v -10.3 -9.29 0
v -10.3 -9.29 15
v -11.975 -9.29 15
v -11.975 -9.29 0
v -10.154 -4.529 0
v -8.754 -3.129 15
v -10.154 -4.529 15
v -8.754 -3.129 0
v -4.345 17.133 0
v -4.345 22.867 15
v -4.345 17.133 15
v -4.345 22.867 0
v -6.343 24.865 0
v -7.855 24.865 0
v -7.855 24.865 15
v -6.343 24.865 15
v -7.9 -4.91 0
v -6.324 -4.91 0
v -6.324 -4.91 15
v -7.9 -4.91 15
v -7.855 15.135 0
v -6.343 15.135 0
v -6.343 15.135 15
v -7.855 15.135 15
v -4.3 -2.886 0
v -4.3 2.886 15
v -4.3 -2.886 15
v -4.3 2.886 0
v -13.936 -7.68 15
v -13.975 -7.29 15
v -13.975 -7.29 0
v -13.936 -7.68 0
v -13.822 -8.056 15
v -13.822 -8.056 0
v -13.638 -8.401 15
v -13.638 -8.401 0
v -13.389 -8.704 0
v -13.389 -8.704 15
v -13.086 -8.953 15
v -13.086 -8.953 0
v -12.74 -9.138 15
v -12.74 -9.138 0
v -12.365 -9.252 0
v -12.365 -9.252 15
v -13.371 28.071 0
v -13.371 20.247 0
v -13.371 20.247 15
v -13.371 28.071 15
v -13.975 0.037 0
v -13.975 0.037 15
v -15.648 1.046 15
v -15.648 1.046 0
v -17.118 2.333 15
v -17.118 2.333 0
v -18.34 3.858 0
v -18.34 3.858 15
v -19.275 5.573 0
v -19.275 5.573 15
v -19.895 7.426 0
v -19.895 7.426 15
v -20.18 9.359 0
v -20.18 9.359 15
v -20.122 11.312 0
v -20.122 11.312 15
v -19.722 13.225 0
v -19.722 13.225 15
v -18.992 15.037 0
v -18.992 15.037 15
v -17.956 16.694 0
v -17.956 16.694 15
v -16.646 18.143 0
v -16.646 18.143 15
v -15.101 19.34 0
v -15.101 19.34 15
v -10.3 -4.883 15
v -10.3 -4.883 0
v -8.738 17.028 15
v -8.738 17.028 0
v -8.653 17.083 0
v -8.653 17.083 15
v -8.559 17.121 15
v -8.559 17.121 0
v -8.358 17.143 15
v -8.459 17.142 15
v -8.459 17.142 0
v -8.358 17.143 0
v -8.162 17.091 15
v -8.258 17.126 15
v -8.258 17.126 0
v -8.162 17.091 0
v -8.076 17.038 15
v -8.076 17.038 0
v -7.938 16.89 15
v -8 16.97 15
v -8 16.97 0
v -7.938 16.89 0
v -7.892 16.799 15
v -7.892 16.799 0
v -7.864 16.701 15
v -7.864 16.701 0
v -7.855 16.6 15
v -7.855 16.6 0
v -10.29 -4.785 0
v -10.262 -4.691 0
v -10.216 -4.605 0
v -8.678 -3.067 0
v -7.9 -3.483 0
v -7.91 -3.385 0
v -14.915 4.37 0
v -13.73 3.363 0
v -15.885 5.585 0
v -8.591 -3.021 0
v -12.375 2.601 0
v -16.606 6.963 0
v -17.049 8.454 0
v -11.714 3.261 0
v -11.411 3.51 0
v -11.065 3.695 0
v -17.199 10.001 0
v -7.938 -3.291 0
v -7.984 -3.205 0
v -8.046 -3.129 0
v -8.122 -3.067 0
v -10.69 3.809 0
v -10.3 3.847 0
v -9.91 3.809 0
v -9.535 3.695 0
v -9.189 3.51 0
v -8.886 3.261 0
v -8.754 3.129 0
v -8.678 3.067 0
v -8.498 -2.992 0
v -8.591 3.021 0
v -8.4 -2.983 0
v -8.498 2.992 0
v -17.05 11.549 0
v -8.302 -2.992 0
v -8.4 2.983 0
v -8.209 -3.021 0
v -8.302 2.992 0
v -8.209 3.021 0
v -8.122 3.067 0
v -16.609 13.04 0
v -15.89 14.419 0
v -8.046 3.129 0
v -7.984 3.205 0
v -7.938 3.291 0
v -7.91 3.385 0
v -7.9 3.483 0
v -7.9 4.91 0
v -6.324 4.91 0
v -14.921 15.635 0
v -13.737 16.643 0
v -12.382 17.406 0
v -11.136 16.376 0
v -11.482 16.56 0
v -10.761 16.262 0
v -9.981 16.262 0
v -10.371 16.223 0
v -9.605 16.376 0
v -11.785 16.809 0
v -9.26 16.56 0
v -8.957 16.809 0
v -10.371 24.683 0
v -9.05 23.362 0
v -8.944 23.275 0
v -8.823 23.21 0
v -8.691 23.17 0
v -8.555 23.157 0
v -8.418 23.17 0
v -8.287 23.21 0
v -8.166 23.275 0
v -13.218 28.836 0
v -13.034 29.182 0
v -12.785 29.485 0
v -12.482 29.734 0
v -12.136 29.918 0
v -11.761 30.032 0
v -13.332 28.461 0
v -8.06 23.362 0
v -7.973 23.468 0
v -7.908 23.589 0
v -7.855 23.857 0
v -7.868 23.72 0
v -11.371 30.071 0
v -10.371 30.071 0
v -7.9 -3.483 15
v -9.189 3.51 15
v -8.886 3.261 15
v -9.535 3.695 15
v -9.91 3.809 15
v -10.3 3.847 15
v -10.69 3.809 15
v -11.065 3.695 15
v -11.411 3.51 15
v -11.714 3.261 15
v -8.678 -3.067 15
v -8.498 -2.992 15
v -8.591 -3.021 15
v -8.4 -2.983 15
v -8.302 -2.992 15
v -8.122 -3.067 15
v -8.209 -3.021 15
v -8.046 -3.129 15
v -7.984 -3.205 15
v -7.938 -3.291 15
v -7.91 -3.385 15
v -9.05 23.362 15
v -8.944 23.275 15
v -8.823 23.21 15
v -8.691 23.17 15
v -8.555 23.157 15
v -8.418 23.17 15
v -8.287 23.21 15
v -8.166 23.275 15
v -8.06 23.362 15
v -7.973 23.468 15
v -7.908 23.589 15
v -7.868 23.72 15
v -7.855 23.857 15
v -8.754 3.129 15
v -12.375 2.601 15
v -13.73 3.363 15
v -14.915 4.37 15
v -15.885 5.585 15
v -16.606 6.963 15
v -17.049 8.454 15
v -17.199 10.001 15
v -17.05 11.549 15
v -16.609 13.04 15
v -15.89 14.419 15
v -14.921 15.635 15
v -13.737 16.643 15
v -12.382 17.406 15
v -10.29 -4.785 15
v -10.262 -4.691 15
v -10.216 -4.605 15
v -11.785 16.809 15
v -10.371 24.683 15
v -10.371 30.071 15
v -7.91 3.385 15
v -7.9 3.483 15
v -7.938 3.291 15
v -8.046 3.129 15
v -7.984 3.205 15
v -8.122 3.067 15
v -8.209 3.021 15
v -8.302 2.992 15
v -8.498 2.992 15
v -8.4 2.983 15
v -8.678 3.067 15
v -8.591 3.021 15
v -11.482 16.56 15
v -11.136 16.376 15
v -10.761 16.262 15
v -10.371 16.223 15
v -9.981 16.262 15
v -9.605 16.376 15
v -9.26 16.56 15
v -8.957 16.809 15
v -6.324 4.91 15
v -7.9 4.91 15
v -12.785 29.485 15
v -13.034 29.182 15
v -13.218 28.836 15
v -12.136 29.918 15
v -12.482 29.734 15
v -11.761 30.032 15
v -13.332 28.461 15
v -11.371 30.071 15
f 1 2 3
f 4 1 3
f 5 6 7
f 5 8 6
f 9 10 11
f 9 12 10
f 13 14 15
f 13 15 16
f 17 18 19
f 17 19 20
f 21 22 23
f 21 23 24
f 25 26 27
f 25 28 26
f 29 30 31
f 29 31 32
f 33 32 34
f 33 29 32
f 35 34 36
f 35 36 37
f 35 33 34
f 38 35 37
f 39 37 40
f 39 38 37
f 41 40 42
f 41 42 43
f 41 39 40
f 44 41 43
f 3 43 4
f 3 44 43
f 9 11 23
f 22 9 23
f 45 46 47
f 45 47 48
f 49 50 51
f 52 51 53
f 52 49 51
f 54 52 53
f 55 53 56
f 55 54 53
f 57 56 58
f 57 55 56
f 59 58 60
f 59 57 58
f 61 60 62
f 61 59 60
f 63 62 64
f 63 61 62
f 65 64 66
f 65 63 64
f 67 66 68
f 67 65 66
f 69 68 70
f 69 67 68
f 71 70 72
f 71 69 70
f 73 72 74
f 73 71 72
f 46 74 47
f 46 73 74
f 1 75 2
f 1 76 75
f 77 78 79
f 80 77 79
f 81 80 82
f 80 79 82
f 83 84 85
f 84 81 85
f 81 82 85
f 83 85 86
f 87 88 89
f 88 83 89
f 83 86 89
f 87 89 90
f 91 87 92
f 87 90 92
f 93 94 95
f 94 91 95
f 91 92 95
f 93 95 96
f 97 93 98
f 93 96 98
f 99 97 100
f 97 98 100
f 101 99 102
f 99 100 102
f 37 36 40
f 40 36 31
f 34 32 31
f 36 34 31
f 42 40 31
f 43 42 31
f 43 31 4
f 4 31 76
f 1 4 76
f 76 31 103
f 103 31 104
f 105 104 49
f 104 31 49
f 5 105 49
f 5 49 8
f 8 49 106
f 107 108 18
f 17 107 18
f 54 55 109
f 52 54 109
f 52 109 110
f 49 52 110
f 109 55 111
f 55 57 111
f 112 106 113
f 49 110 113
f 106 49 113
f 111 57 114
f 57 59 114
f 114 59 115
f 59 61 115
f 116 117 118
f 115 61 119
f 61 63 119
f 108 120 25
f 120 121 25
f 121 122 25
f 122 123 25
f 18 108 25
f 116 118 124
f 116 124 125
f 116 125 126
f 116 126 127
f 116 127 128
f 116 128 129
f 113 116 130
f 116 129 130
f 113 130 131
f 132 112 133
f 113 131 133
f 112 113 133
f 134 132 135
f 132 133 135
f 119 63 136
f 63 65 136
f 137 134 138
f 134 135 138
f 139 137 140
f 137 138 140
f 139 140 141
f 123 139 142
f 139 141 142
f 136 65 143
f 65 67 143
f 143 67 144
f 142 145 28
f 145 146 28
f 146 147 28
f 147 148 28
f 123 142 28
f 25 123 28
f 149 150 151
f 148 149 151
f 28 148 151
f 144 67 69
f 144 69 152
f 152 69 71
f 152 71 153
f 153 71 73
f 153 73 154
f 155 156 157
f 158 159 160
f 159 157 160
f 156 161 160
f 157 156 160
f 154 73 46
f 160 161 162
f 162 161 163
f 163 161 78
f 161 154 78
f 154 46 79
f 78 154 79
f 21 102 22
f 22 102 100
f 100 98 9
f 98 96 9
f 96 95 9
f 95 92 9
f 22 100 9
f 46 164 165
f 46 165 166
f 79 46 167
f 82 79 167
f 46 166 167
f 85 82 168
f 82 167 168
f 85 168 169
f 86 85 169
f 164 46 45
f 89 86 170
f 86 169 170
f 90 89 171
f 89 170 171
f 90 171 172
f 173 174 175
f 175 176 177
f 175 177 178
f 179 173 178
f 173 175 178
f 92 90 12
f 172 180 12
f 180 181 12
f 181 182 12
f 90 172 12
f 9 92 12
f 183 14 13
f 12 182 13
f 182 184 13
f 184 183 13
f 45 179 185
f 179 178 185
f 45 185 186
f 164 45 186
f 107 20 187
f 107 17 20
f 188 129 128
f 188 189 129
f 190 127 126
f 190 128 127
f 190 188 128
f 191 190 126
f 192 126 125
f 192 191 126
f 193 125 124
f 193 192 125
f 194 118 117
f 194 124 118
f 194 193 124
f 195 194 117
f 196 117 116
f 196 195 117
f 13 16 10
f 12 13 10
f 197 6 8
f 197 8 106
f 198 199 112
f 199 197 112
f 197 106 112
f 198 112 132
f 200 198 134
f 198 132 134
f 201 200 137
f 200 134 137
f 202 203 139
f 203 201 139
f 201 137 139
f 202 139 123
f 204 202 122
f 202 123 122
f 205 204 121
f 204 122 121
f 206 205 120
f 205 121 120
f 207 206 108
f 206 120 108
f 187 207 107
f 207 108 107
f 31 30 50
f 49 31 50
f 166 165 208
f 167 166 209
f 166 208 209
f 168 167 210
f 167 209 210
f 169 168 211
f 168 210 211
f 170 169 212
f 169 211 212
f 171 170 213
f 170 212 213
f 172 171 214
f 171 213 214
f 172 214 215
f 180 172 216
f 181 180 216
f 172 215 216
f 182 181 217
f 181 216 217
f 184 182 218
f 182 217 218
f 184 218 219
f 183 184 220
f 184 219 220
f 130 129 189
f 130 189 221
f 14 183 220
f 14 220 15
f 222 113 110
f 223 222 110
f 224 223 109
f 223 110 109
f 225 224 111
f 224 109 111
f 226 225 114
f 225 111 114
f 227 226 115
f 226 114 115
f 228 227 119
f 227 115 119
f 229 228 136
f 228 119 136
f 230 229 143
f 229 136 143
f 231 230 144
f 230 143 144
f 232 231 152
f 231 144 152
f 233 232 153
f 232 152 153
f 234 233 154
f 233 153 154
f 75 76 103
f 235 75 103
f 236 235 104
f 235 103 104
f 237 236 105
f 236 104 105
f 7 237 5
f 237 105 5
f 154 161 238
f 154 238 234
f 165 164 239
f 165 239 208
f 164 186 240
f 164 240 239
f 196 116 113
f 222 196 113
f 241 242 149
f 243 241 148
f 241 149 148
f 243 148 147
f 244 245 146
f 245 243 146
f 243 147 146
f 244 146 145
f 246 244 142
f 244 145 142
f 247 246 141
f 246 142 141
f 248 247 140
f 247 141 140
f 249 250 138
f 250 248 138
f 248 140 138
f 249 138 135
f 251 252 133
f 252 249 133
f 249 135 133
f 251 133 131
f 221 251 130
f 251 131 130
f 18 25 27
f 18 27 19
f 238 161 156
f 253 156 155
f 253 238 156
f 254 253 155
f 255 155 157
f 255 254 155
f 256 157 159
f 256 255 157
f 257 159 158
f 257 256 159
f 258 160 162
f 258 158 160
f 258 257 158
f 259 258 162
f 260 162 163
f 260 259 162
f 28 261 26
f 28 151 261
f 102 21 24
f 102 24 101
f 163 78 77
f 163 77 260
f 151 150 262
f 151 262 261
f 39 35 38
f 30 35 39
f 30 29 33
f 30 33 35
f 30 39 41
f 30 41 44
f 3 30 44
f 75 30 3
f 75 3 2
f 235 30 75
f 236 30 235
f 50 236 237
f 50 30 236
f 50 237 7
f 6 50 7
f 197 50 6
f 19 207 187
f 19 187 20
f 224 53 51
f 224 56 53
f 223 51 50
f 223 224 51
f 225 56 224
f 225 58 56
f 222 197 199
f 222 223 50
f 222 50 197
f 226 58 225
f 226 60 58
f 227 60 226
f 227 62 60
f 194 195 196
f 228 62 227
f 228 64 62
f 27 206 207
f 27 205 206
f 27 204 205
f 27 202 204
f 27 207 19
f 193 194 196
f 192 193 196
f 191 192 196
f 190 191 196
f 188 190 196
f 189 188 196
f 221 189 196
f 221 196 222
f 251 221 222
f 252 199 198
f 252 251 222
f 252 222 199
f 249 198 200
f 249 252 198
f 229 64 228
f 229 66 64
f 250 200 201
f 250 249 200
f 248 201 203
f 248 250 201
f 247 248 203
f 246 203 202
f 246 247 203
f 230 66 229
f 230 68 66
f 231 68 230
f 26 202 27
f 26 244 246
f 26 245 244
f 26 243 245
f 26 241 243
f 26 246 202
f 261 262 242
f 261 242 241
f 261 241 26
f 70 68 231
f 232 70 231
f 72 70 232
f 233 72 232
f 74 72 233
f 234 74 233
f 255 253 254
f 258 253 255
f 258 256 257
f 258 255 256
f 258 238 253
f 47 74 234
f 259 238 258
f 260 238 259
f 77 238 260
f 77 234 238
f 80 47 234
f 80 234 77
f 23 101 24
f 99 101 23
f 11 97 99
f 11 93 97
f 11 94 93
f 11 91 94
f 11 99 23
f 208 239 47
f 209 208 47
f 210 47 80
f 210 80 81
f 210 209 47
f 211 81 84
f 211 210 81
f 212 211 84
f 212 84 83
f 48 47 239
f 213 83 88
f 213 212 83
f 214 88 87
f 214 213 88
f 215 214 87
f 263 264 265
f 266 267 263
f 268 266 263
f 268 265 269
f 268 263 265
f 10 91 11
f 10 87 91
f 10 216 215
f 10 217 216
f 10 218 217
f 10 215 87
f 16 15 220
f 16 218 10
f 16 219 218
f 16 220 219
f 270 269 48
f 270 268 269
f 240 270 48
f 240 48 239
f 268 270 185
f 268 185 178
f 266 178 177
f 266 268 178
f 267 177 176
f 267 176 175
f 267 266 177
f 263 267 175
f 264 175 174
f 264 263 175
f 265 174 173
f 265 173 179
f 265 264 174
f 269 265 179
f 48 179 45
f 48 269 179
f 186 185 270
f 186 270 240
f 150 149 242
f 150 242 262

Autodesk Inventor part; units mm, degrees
ref_plane "YZ Plane" through (0, 0, 0) normal (1, 0, 0) x (0, 1, 0)
ref_plane "XZ Plane" through (0, 0, 0) normal (0, 1, 0) x (-1, 0, 0)
ref_plane "Work Plane1" through (0, 0, 0) normal (0, 0, 1) x (1, 0, 0)
sketch "Sketch1" plane through (0, 0, 0) normal (0, 0, 1) x (1, 0, 0)
  line L0 (-144.9451, -10.0865) -> (145.0549, -10.0865) projected
  line L1 (-9.9451, 37.9135) -> (-9.9451, -12.0865) projected
  line L2 (-122.9451, 37.9135) -> (-9.9451, 37.9135) projected
  line L3 (-122.9451, -12.0865) -> (-122.9451, 37.9135) projected
  line L4 (-122.9451, -12.0865) -> (-9.9451, -12.0865) projected
  line L5 (-2.2167, -121.222) -> (-2.2167, -6.222) projected
  line L6 (-8.2, 6.2) -> (-5.2101, 6.2)
  line L7 (-5.2101, 6.2) -> (-3.0101, 4)
  line L8 (-3.0101, 4) -> (-0.5, 4)
  line L9 (-0.5, 4) -> (0, 3.5)
  line L10 (0, 3.5) -> (0.5, 4)
  line L11 (0.5, 4) -> (3.0101, 4)
  line L12 (3.0101, 4) -> (5.2101, 6.2)
  line L13 (5.2101, 6.2) -> (8.2, 6.2)
  line L14 (8.2, 6.2) -> (8.2, 13.8828)
  line L15 (8.2, 13.8828) -> (5.2101, 13.8828)
  line L16 (5.2101, 13.8828) -> (3.0101, 16.0828)
  line L17 (3.0101, 16.0828) -> (0.5, 16.0828)
  line L18 (0.5, 16.0828) -> (0, 16.5828)
  line L19 (0, 16.5828) -> (-0.5, 16.0828)
  line L20 (-0.5, 16.0828) -> (-3.0101, 16.0828)
  line L21 (-3.0101, 16.0828) -> (-5.2101, 13.8828)
  line L22 (-5.2101, 13.8828) -> (-8.2, 13.8828)
  line L23 (-8.2, 13.8828) -> (-8.2, 6.2)
  line L24 (-8.2, 16.6) -> (-8.2, 14.7899)
  line L25 (-8.2, 14.7899) -> (-6.2, 14.7899)
  line L26 (-6.2, 14.7899) -> (-4, 16.9899)
  line L27 (-4, 16.9899) -> (-4, 19.5)
  line L28 (-4, 19.5) -> (-3.5, 20)
  line L29 (-3.5, 20) -> (-4, 20.5)
  line L30 (-4, 20.5) -> (-4, 23.0101)
  line L31 (-4, 23.0101) -> (-6.2, 25.2101)
  line L32 (-6.2, 25.2101) -> (-8.2, 25.2101)
  line L33 (-8.2, 25.2101) -> (-8.2, 23)
  line L34 (-8.2, 23) -> (-10, 24.8)
  line L35 (-10, 24.8) -> (-10, 30)
  line L36 (-9.0101, 30) -> (-4.8, 30)
  line L37 (-4.8, 30) -> (-3, 28.2)
  line L38 (-3, 28.2) -> (-5.2101, 28.2)
  line L39 (-5.2101, 28.2) -> (-5.2101, 26.2)
  line L40 (-5.2101, 26.2) -> (-3.0101, 24)
  line L41 (-3.0101, 24) -> (-0.5, 24)
  line L42 (-0.5, 24) -> (0, 23.5)
  line L43 (0, 23.5) -> (0.5, 24)
  line L44 (0.5, 24) -> (3.0101, 24)
  line L45 (3.0101, 24) -> (5.2101, 26.2)
  line L46 (5.2101, 26.2) -> (5.2101, 28.2)
  line L47 (5.2101, 28.2) -> (3, 28.2)
  line L48 (3, 28.2) -> (4.8, 30)
  line L49 (4.8, 30) -> (10, 30)
  line L50 (10, 30) -> (10, 24.8)
  line L51 (10, 24.8) -> (8.2, 23)
  line L52 (8.2, 23) -> (8.2, 25.2101)
  line L53 (8.2, 25.2101) -> (6.2, 25.2101)
  line L54 (6.2, 25.2101) -> (4, 23.0101)
  line L55 (4, 23.0101) -> (4, 20.5)
  line L56 (4, 20.5) -> (3.5, 20)
  line L57 (3.5, 20) -> (4, 19.5)
  line L58 (4, 19.5) -> (4, 16.9899)
  line L59 (4, 16.9899) -> (6.2, 14.7899)
  line L60 (6.2, 14.7899) -> (8.2, 14.7899)
  line L61 (8.2, 14.7899) -> (8.2, 17)
  line L62 (8.2, 17) -> (10, 15.2)
  line L63 (10, 15.2) -> (10, 4.8828)
  arc A0 (9.9414, 4.7414) -> (10, 4.8828) centre (9.8, 4.8828) ccw
  line L64 (9.9414, 4.7414) -> (8.5414, 3.3414)
  arc A1 (8.2, 3.4828) -> (8.5414, 3.3414) centre (8.4, 3.4828) ccw
  line L65 (8.2, 3.4828) -> (8.2, 5.2101)
  line L66 (8.2, 5.2101) -> (6.2, 5.2101)
  line L67 (6.2, 5.2101) -> (4, 3.0101)
  line L68 (4, 3.0101) -> (4, 0.5)
  line L69 (4, 0.5) -> (3.5, 0)
  line L70 (3.5, 0) -> (4, -0.5)
  line L71 (4, -0.5) -> (4, -3.0101)
  line L72 (4, -3.0101) -> (6.2, -5.2101)
  line L73 (6.2, -5.2101) -> (8.2, -5.2101)
  line L74 (8.2, -5.2101) -> (8.2, -3.4828)
  arc A2 (8.5414, -3.3414) -> (8.2, -3.4828) centre (8.4, -3.4828) ccw
  line L75 (8.5414, -3.3414) -> (9.9414, -4.7414)
  arc A3 (10, -4.8828) -> (9.9414, -4.7414) centre (9.8, -4.8828) ccw
  line L76 (10, -4.8828) -> (10, -9.8)
  arc A4 (9.8, -10) -> (10, -9.8) centre (9.8, -9.8) ccw
  line L77 (9.8, -10) -> (4.8828, -10)
  arc A5 (4.7414, -9.9414) -> (4.8828, -10) centre (4.8828, -9.8) ccw
  line L78 (4.7414, -9.9414) -> (3.3414, -8.5414)
  arc A6 (3.4828, -8.2) -> (3.3414, -8.5414) centre (3.4828, -8.4) ccw
  line L79 (3.4828, -8.2) -> (5.2101, -8.2)
  line L80 (5.2101, -8.2) -> (5.2101, -6.2)
  line L81 (5.2101, -6.2) -> (3.0101, -4)
  line L82 (3.0101, -4) -> (0.5, -4)
  line L83 (0.5, -4) -> (0, -3.5)
  line L84 (0, -3.5) -> (-0.5, -4)
  line L85 (-0.5, -4) -> (-3.0101, -4)
  line L86 (-3.0101, -4) -> (-5.2101, -6.2)
  line L87 (-5.2101, -6.2) -> (-5.2101, -8.2)
  line L88 (-5.2101, -8.2) -> (-3.4828, -8.2)
  arc A7 (-3.3414, -8.5414) -> (-3.4828, -8.2) centre (-3.4828, -8.4) ccw
  line L89 (-3.3414, -8.5414) -> (-4.7414, -9.9414)
  arc A8 (-4.8828, -10) -> (-4.7414, -9.9414) centre (-4.8828, -9.8) ccw
  line L90 (-10, -9.8) -> (-10, -4.8828)
  arc A9 (-9.9414, -4.7414) -> (-10, -4.8828) centre (-9.8, -4.8828) ccw
  line L91 (-9.9414, -4.7414) -> (-8.5414, -3.3414)
  arc A10 (-8.2, -3.4828) -> (-8.5414, -3.3414) centre (-8.4, -3.4828) ccw
  line L92 (-8.2, -3.4828) -> (-8.2, -5.2101)
  line L93 (-8.2, -5.2101) -> (-6.2, -5.2101)
  line L94 (-6.2, -5.2101) -> (-4, -3.0101)
  line L95 (-4, -3.0101) -> (-4, -0.5)
  line L96 (-4, -0.5) -> (-3.5, 0)
  line L97 (-3.5, 0) -> (-4, 0.5)
  line L98 (-4, 0.5) -> (-4, 3.0101)
  line L99 (-4, 3.0101) -> (-6.2, 5.2101)
  line L100 (-6.2, 5.2101) -> (-8.2, 5.2101)
  line L101 (-8.2, 5.2101) -> (-8.2, 3.4828)
  arc A11 (-8.5414, 3.3414) -> (-8.2, 3.4828) centre (-8.4, 3.4828) ccw
  line L102 (-8.5414, 3.3414) -> (-9.9414, 4.7414)
  arc A12 (-10, 4.8828) -> (-9.9414, 4.7414) centre (-9.8, 4.8828) ccw
  line L103 (-10, 4.8828) -> (-10, 15.2)
  line L104 (-10, 15.2) -> (-8.4, 16.8)
  arc A13 (-8.2, 16.6) -> (-8.4, 16.8) centre (-8.4, 16.6) ccw
  circle A14 centre (0, 20) radius 2
  circle A15 centre (0, 0) radius 2
  line L105 (-4.8828, -10) -> (-8.2, -10)
  line L106 (-10.3707, 24.6827) -> (-7.8549, 22.1669)
  line L107 (-7.8549, 22.1669) -> (-7.8549, 24.865)
  line L108 (-7.8549, 24.865) -> (-6.3429, 24.865)
  line L109 (-6.3429, 24.865) -> (-4.3451, 22.8671)
  line L110 (-4.3451, 22.8671) -> (-4.3451, 20.2929)
  line L111 (-4.3451, 19.7071) -> (-4.3451, 17.1329)
  line L112 (-4.3451, 17.1329) -> (-6.3429, 15.135)
  line L113 (-6.3429, 15.135) -> (-7.8549, 15.135)
  line L114 (-7.8549, 15.135) -> (-7.8549, 16.6)
  arc A16 (-7.8549, 16.6) -> (-8.7381, 17.0275) centre (-8.4, 16.6) ccw
  line L115 (-8.7381, 17.0275) -> (-10.3707, 15.395)
  line L116 (-10.3, 4.6757) -> (-8.7536, 3.1293)
  arc A17 (-8.7536, 3.1293) -> (-7.9, 3.4828) centre (-8.4, 3.4828) ccw
  line L117 (-7.9, 3.4828) -> (-7.9, 4.9101)
  line L118 (-7.9, 4.9101) -> (-6.3243, 4.9101)
  line L119 (-6.3243, 4.9101) -> (-4.3, 2.8858)
  line L120 (-4.3, 2.8858) -> (-4.3, 0.2929)
  line L121 (-4.3, -0.2929) -> (-4.3, -2.8858)
  line L122 (-4.3, -2.8858) -> (-6.3243, -4.9101)
  line L123 (-6.3243, -4.9101) -> (-7.9, -4.9101)
  line L124 (-7.9, -4.9101) -> (-7.9, -3.4828)
  arc A18 (-7.9, -3.4828) -> (-8.7536, -3.1293) centre (-8.4, -3.4828) ccw
  line L125 (-8.7536, -3.1293) -> (-10.1536, -4.5293)
  arc A19 (-10.1536, -4.5293) -> (-10.3, -4.8828) centre (-9.8, -4.8828) ccw
  line L126 (-10.3, -4.8828) -> (-10.3, -9.2902)
  line L127 (-4.3451, 19.7071) -> (-4.3451, 20.2929)
  line L128 (-4.3, -0.2929) -> (-4.3, 0.2929)
  line L129 (-10.3, -9.2902) -> (-13.9747, -9.2902)
  line L130 (-13.3707, 30.0707) -> (-10.3707, 30.0707)
  line L131 (-144.9451, 15.0306) -> (-1.0211, 15.0306) projected
  line L132 (-10.3707, 30.0707) -> (-10.3707, 15.395)
  line L133 (-10.3, 4.6757) -> (-10.3, -9.2902)
  line L134 (-10.2451, 15.0306) -> (-10.2451, 15.135)
  line L135 (-13.9747, -9.2902) -> (-13.9747, 0.0372)
  arc A20 (-12.3822, 17.4064) -> (-12.3746, 2.6011) centre (-9.1048, 10.0054) ccw
  arc A21 (-13.3707, 20.2467) -> (-13.9747, 0.0372) centre (-9.1048, 10.0054) ccw
  line L136 (-13.3707, 16.8707) -> (-13.3707, 16.8842)
  line L137 (-13.3707, 20.2467) -> (-13.3707, 30.0707)
  line L138 (-10.3707, 15.395) -> (-12.3822, 17.4064)
  line L139 (-10.3707, 15.395) -> (-8.2646, 15.395) construction
  line L140 (-10.3, 4.6757) -> (-12.3746, 2.6011)
  line L141 (-10.3, 4.6757) -> (-7.366, 4.6757) construction
  point P0 (0, 0)
  point P1 (145.0549, -10.0865)
  point P2 (-9.8, -10)
  point P3 (-10.2243, 4.6)
  point P4 (-13.9747, 3.5401)
  point P5 (-10.3, 24.6757)
  point P6 (-10.3, -4.8828)
  point P7 (-10.3, -4.8828)
  dimension "d0" = 0.4
  dimension "d1" = 3
  dimension "d13" = 3
  dimension "d14" = 135
  dimension "d15" = 135
extrude "Extrusion1" add sketch "Sketch1" along normal blind 15 contours A21 L137 L130 L132 L138 A20 L131 | L131 A20 L140 L133 L126 L129 L135 A21 | L125 A19 L133 L116 L1 | L1 L116 A17 L117 L118 L119 L120 L128 L121 L122 L123 L124 A18 L125 | L106 L107 L108 L109 L110 L127 L111 L112 L113 L114 A16 L115 L1 | L1 L115 L132 L106
fillet "Fillet1" radius 0.7 1 edges at (-7.8549, 22.1669, 7.5)
fillet "Fillet2" radius 2 2 edges at (-13.9747, -9.2902, 7.5) (-13.3707, 30.0707, 7.5)
fillet "Fillet3" radius 2 2 edges at (-10.3, 4.6757, 7.5) (-10.3707, 15.395, 7.5)
properties part number "Camera Wire Clip"
